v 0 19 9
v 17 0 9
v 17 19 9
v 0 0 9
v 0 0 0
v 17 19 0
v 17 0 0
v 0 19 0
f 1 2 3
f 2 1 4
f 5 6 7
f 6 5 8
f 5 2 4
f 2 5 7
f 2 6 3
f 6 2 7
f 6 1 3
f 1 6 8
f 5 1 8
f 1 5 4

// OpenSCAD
// Generated by SolidPython 1.0.1 on 2020-07-29 00:46:56


cube(size = [17, 19, 9]);
/***********************************************
*********      SolidPython code:      **********
************************************************
 
# import packages: SolidPython
from solid import *
from solid.utils import *
from itertools import chain, combinations, permutations


class Resize:

    def __init__(self, scad_file):
        self.scad_file = scad_file
        #self.scad_file = import_scad(scad_file)
        # cone/cylinder param:
        self.r1 = 0
        self.r2 = 0
        self.h = 0
        # rectangular prism param:
        self.w = 0
        self.l = 0
        # ellipse param:
        self.r = 0

    # import OpenScad code (file name corresponds to shape)


    # classify shape + parameters
    def assign(self, param1, param2, param3):
        if self.scad_file == 'cone.scad':
            self.r1 = param1
            self.r2 = param2
            self.h = param3
        elif self.scad_file == 'cylinder.scad':
            self.r1 = param1
            self.r2 = param2
            self.h = param3
        elif self.scad_file == 'rectangularPrism.scad':
            self.h = param1
            self.l = param2
            self.w = param3
        else:
            self.r = param1
            self.h = param2

    # resize parameters
    def iterate(self):
        x = range(3, 20, 2)
        i = 1
        if self.scad_file == 'cone.scad':
            tempList = list(permutations(x, 2))
            for temp in tempList:
                param1 = temp[0]
                param2 = temp[1]
                filepath = 'produced_scad_files/' + 'cone' + str(param1) + '_' + str(param2) + '_' + '.scad'
                scad_render_to_file(cylinder(h=param1, r1=param2, r2=0), filepath)

        elif self.scad_file == 'cylinder.scad':
            tempList = list(permutations(x, 3))
            for temp in tempList:
                param1 = temp[0]
                param2 = temp[1]
                filepath = 'produced_scad_files/' + 'cylinder' + str(param1) + '_' + str(param2) + '_' + '.scad'
                scad_render_to_file(cylinder(h=param1, r1=param2, r2=param2), filepath)

        elif self.scad_file == 'rectangularPrism.scad':
            tempList = list(permutations(x, 3))
            for temp in tempList:
                param1 = temp[0]
                param2 = temp[1]
                param3 = temp[2]
                filepath = 'produced_scad_files/' + 'rectangularPrism' + str(param1) + '_' + str(param2) + '_' + str(
                    param3) + '.scad'
                scad_render_to_file(cube(size=(param1, param2, param3)), filepath)

        elif self.scad_file == 'ellipse.scad':
            tempList = list(permutations(x, 4))
            for temp in tempList:
                param1 = temp[0]
                param2 = temp[1]
                param3 = temp[2]
                param4 = temp[3]
                filepath = 'produced_scad_files/' + 'ellipse' + str(param1) + '_' + str(param2) + '_' + str(param3) + '_' + str(param4) + '.scad'
                scad_render_to_file(scale([param1, param2, param3])(sphere(r=param4)), filepath)

    def render_to_scadfile(self):
        scad_render_to_file(scad, 'example.scad') 
 
************************************************/
